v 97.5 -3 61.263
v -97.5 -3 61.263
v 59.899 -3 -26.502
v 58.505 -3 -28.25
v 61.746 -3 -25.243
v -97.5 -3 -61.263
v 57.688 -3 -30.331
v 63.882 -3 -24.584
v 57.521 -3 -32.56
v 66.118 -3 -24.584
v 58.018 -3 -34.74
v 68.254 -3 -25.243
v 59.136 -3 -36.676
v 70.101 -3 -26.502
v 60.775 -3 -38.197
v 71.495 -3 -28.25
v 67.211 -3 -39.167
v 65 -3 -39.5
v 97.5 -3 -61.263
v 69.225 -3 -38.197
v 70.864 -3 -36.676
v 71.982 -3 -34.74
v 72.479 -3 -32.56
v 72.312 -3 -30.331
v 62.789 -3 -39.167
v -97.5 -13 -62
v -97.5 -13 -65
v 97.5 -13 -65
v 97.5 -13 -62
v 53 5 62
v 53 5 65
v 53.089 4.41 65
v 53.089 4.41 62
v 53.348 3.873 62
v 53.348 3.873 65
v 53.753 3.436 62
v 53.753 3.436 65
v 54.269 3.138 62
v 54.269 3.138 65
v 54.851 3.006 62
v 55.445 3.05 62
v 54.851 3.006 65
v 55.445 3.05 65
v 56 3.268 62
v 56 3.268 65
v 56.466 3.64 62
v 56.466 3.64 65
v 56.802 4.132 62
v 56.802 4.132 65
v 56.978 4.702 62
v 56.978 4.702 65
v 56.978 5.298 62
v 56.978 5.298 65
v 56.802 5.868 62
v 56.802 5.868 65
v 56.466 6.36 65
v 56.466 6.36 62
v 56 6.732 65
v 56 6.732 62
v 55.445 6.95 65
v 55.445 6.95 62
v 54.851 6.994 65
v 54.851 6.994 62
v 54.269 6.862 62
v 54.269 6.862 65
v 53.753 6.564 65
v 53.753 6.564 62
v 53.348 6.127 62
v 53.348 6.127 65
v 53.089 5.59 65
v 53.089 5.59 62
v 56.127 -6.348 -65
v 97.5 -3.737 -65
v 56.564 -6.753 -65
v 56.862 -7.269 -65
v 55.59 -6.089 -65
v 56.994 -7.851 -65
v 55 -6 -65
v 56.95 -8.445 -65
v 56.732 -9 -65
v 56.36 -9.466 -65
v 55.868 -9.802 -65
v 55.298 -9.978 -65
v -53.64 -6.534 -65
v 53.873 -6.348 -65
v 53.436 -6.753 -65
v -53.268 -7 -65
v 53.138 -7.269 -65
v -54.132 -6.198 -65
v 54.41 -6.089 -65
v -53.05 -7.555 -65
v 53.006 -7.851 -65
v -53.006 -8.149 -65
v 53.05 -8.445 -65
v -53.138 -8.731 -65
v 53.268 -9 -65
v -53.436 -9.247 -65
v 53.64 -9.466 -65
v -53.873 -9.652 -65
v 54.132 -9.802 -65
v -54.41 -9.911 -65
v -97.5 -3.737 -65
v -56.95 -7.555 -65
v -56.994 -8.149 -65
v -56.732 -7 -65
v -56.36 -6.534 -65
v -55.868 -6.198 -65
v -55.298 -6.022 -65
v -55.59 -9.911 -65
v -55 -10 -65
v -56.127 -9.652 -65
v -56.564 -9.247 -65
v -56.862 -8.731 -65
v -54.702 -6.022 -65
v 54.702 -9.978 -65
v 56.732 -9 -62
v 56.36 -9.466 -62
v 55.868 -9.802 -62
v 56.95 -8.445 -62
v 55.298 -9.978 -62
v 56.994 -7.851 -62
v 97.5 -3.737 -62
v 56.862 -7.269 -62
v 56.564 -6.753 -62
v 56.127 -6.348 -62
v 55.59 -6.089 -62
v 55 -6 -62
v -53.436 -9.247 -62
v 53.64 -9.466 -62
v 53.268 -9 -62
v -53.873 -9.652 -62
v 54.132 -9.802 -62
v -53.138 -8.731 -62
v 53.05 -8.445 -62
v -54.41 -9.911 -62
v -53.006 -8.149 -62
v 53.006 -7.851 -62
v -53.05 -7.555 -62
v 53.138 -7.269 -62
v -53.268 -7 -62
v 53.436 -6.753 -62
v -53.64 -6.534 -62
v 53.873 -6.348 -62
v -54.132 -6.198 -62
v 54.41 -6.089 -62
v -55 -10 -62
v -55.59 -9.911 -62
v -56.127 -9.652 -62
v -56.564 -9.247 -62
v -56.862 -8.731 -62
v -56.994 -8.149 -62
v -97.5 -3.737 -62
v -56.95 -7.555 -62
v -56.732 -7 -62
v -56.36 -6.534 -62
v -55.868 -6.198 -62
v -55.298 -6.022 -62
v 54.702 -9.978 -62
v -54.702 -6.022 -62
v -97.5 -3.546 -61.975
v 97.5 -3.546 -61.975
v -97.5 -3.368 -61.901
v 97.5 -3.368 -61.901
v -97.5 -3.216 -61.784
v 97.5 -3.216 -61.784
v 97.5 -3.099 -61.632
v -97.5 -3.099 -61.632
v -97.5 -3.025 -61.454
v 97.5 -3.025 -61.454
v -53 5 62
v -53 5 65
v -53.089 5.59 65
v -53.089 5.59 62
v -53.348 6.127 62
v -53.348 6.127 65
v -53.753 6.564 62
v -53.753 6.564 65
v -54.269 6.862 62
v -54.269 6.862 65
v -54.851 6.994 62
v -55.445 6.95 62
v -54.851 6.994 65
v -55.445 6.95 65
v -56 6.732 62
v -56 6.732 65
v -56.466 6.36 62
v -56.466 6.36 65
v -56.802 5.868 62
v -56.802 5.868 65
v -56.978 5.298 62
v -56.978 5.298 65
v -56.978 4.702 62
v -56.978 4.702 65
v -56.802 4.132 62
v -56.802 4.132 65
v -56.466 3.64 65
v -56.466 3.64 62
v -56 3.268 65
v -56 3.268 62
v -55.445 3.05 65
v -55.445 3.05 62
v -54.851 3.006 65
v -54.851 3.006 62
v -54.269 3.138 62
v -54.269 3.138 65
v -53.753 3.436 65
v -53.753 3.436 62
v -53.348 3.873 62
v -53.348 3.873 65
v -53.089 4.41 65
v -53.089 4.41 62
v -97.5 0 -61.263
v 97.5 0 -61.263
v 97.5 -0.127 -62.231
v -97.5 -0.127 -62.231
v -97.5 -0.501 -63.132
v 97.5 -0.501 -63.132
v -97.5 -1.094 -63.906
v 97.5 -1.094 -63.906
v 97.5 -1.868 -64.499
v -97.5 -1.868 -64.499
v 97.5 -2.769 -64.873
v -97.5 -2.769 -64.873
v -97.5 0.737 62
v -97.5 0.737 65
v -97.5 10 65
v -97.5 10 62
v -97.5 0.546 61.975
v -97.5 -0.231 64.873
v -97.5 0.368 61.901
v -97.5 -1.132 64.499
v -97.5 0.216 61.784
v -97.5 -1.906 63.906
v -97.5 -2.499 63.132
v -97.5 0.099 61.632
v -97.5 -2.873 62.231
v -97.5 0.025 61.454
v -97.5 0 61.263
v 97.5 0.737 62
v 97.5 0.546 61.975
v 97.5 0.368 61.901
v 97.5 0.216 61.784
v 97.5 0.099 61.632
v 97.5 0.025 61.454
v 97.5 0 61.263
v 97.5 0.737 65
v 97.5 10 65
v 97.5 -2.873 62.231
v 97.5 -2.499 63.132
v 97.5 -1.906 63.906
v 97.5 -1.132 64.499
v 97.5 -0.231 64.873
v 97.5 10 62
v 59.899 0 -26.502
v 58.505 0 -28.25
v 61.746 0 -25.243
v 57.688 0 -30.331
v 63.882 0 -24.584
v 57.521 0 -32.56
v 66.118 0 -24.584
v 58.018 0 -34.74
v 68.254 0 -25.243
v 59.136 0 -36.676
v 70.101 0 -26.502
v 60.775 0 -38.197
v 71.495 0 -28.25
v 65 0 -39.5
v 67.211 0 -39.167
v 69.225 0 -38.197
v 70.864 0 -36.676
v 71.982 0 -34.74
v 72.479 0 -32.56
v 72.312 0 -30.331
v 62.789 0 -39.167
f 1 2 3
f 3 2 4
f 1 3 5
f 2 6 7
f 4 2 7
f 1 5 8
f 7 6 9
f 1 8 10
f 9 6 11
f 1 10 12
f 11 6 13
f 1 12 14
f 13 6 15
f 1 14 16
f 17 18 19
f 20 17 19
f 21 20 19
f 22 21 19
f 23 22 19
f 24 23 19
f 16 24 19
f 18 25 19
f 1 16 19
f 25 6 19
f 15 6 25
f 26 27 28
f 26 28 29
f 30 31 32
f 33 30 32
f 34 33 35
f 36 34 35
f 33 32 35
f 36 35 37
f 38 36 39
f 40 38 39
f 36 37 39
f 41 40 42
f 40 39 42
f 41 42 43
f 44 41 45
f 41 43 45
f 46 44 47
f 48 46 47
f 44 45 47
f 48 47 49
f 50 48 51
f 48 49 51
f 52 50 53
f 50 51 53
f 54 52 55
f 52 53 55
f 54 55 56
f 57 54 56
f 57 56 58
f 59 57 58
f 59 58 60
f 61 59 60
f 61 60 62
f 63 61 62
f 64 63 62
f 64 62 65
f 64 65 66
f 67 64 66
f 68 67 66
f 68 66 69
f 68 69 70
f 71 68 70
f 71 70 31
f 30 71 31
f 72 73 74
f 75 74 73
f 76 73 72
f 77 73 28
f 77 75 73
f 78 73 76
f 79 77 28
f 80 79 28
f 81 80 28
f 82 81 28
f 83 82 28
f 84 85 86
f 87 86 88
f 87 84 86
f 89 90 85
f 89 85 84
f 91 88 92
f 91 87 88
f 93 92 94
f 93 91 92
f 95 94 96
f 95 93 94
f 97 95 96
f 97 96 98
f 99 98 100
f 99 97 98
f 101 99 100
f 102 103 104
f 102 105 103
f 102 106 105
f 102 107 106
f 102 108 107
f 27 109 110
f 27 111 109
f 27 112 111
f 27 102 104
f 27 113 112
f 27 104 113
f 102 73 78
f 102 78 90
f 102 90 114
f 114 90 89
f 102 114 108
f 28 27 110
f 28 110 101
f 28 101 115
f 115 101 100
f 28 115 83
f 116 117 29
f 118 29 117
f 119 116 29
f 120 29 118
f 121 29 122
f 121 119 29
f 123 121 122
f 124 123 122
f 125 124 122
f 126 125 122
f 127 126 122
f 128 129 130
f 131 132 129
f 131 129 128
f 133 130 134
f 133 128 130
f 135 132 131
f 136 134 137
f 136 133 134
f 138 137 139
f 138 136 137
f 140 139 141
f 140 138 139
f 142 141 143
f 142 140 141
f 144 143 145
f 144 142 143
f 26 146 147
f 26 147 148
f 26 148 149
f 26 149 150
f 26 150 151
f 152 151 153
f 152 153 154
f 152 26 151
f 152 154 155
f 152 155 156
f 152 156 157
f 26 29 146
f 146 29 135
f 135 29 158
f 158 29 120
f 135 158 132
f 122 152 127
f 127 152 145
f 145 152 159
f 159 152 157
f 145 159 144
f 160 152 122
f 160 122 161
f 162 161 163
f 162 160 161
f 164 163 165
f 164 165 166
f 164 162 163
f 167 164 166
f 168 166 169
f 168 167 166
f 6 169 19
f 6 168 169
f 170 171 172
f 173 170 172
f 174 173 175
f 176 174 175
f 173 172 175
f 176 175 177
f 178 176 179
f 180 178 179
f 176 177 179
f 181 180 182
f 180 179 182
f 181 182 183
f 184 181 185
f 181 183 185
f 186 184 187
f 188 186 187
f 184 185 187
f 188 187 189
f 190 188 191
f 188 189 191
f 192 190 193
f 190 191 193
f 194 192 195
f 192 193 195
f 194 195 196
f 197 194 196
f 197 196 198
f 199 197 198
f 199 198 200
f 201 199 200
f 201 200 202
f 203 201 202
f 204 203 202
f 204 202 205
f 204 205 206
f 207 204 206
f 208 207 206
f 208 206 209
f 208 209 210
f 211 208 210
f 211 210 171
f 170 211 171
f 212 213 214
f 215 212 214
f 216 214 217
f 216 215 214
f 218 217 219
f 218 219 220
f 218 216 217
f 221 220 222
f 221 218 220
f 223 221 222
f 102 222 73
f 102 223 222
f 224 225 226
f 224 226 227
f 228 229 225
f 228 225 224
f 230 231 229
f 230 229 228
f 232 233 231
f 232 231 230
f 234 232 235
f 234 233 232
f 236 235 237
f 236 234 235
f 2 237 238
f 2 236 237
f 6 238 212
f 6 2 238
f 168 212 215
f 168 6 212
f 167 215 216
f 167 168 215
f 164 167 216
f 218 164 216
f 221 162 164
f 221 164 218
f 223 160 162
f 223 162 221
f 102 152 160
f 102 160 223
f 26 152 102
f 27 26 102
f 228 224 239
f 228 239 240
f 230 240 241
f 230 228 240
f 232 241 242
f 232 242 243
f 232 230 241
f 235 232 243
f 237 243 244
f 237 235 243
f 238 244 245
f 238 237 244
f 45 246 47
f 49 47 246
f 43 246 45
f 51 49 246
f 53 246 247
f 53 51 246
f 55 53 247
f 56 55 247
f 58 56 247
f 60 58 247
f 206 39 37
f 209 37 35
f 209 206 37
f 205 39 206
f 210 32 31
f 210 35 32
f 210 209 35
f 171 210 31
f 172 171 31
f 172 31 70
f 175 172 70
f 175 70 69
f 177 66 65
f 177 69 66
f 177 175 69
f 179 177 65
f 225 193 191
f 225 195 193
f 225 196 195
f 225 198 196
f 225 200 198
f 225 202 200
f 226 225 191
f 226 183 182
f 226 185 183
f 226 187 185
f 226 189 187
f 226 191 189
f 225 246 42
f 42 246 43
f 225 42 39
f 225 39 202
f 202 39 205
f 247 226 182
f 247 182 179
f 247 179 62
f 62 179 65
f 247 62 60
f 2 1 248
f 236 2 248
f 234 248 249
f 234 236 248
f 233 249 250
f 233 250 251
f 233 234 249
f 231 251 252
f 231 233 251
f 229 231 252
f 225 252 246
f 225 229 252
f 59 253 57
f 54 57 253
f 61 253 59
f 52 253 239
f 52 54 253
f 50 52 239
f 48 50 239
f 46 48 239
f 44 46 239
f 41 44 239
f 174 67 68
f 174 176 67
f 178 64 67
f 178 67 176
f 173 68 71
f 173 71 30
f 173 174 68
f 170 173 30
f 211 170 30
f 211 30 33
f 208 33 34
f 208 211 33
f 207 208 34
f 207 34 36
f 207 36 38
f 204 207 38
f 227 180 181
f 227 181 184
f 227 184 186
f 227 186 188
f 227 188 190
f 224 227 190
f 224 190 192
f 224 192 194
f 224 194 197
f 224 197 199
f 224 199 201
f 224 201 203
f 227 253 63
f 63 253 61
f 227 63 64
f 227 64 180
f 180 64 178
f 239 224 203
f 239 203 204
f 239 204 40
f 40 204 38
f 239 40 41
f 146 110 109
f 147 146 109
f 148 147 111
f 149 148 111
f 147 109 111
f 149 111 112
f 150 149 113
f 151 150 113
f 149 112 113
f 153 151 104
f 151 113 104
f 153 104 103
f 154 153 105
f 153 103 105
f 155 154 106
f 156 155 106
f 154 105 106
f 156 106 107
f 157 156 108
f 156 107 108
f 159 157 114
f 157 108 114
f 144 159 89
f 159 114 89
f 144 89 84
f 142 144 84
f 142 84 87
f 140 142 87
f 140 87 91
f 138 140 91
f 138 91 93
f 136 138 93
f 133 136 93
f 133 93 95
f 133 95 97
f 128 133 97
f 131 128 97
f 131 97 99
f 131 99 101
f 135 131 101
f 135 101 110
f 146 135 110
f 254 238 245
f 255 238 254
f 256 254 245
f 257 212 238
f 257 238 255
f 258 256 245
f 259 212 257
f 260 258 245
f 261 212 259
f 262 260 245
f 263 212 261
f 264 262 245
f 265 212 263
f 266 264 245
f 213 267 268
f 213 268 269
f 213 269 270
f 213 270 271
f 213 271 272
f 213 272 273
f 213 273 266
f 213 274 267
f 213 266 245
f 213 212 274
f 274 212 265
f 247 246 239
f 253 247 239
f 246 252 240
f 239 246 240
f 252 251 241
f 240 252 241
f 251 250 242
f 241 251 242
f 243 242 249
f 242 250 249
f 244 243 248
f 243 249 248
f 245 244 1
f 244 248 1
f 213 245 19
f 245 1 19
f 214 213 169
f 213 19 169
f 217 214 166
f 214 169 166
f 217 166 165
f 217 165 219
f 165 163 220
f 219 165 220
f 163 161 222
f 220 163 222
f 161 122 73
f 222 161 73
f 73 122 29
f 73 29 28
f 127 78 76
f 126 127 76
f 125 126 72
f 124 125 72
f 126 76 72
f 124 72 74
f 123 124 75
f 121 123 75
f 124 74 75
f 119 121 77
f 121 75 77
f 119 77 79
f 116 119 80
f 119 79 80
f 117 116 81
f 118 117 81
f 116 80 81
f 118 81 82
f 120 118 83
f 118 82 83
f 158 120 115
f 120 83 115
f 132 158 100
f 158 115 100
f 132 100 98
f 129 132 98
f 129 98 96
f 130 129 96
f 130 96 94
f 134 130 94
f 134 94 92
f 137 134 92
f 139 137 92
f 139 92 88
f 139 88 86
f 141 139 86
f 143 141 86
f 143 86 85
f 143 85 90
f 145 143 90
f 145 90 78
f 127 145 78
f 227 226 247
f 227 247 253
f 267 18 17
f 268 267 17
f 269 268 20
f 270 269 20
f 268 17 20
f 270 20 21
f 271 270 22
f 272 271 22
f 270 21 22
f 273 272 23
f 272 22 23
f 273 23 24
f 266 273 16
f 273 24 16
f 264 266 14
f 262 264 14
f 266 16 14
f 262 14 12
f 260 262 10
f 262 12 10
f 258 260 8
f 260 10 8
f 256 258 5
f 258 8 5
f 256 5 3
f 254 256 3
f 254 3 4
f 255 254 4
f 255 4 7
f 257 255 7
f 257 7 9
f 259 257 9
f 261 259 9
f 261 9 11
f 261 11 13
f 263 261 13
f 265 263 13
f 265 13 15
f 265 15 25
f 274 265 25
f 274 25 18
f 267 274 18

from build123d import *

# Parameters (mm, degrees)
SKETCH_1_W                       = 195
SKETCH_1_H                       = 130
SM_BASE_FLANGE_1_DEPTH           = 3
SM_EDGE_FLANGE_1_STRIP_W         = 13.4732
SM_EDGE_FLANGE_1_STRIP_H         = 3
SM_EDGE_FLANGE_1_STRIP_CUT_DEPTH = 195
SM_EDGE_FLANGE_1_DEPTH           = 195
SM_EDGE_FLANGE_2_STRIP_W         = 13.4732
SM_EDGE_FLANGE_2_STRIP_H         = 3
SM_EDGE_FLANGE_2_STRIP_CUT_DEPTH = 195
SM_EDGE_FLANGE_2_DEPTH           = 195
SKETCH_12_R                      = 2
CUT_EXTRUDE_1_DEPTH              = 10
SKETCH_13_R                      = 2
CUT_EXTRUDE_2_DEPTH              = 10
CUT_EXTRUDE_3_REACH              = 119.899
SKETCH_14_R                      = 7.5


# Sheet-metal steps are written as plain solids
with BuildPart() as part:
    # Sketch 1 → 基体-法兰1 (new body)
    with BuildSketch(Plane(origin=(0, 0, 0), x_dir=(1, 0, 0), z_dir=(0, 1, 0))):
        Rectangle(SKETCH_1_W, SKETCH_1_H)
    extrude(amount=-SM_BASE_FLANGE_1_DEPTH)

    # 边线-法兰1 strip (across the edge) → 边线-法兰1 strip cut (cut)
    with BuildSketch(Plane(origin=(-97.5, 0, 65), x_dir=(0, 0, -1), z_dir=(1, 0, 0))):
        with Locations((-3, -1.5)):
            Rectangle(SM_EDGE_FLANGE_1_STRIP_W, SM_EDGE_FLANGE_1_STRIP_H)
    extrude(amount=SM_EDGE_FLANGE_1_STRIP_CUT_DEPTH, mode=Mode.SUBTRACT)

    # 边线-法兰1 section (across the edge) → 边线-法兰1 (add)
    with BuildSketch(Plane(origin=(-97.5, 0, 65), x_dir=(0, 0, -1), z_dir=(1, 0, 0))):
        with BuildLine():
            Line((0, 0.7366), (0, 10))
            Line((0, 10), (3, 10))
            Line((3, 10), (3, 0.7366))
            ThreePointArc((3, 0.7366), (3.215745145, 0.215745145), (3.7366, 0))
            Line((3.7366, 0), (3.7366, -3))
            ThreePointArc((3.7366, -3), (1.094424801, -1.905575199), (0, 0.7366))
        make_face()
    extrude(amount=SM_EDGE_FLANGE_1_DEPTH)

    # 边线-法兰2 strip (across the edge) → 边线-法兰2 strip cut (cut)
    with BuildSketch(Plane(origin=(-97.5, -3, -65), x_dir=(0, 0, 1), z_dir=(1, 0, 0))):
        with Locations((-3, -1.5)):
            Rectangle(SM_EDGE_FLANGE_2_STRIP_W, SM_EDGE_FLANGE_2_STRIP_H)
    extrude(amount=SM_EDGE_FLANGE_2_STRIP_CUT_DEPTH, mode=Mode.SUBTRACT)

    # 边线-法兰2 section (across the edge) → 边线-法兰2 (add)
    with BuildSketch(Plane(origin=(-97.5, -3, -65), x_dir=(0, 0, 1), z_dir=(1, 0, 0))):
        with BuildLine():
            Line((0, 0.7366), (0, 10))
            Line((0, 10), (3, 10))
            Line((3, 10), (3, 0.7366))
            ThreePointArc((3, 0.7366), (3.215745145, 0.215745145), (3.7366, 0))
            Line((3.7366, 0), (3.7366, -3))
            ThreePointArc((3.7366, -3), (1.094424801, -1.905575199), (0, 0.7366))
        make_face()
    extrude(amount=SM_EDGE_FLANGE_2_DEPTH)

    # 草图12 → 切除-拉伸1 (cut)
    with BuildSketch(Plane.XY.offset(65)):
        with Locations((-55, 5)):
            Circle(SKETCH_12_R)
        with Locations(Location((55, 5, 0), (0, 0, 180))):
            Circle(SKETCH_12_R)
    extrude(amount=-CUT_EXTRUDE_1_DEPTH, mode=Mode.SUBTRACT)

    # 草图13 → 切除-拉伸2 (cut)
    with BuildSketch(Plane(origin=(0, 0, -65), x_dir=(-1, 0, 0), z_dir=(0, 0, -1))):
        with Locations(Location((-55, -8, 0), (0, 0, 90))):
            Circle(SKETCH_13_R)
        with Locations(Location((55, -8, 0), (0, 0, 270))):
            Circle(SKETCH_13_R)
    extrude(amount=-CUT_EXTRUDE_2_DEPTH, mode=Mode.SUBTRACT)

    # 草图14 → 切除-拉伸3 (cut, up to next)
    with BuildSketch(Plane.XZ.offset(3), mode=Mode.PRIVATE) as cut_extrude_3_sk1:
        with Locations(Location((65, -32, 0), (0, 0, 270))):
            Circle(SKETCH_14_R)
    cut_extrude_3_tool1 = extrude(cut_extrude_3_sk1.sketch, amount=-CUT_EXTRUDE_3_REACH, mode=Mode.PRIVATE) & part.part
    add(cut_extrude_3_tool1.solids().sort_by_distance((65, -3, -32))[0], mode=Mode.SUBTRACT)


solid = part.part
